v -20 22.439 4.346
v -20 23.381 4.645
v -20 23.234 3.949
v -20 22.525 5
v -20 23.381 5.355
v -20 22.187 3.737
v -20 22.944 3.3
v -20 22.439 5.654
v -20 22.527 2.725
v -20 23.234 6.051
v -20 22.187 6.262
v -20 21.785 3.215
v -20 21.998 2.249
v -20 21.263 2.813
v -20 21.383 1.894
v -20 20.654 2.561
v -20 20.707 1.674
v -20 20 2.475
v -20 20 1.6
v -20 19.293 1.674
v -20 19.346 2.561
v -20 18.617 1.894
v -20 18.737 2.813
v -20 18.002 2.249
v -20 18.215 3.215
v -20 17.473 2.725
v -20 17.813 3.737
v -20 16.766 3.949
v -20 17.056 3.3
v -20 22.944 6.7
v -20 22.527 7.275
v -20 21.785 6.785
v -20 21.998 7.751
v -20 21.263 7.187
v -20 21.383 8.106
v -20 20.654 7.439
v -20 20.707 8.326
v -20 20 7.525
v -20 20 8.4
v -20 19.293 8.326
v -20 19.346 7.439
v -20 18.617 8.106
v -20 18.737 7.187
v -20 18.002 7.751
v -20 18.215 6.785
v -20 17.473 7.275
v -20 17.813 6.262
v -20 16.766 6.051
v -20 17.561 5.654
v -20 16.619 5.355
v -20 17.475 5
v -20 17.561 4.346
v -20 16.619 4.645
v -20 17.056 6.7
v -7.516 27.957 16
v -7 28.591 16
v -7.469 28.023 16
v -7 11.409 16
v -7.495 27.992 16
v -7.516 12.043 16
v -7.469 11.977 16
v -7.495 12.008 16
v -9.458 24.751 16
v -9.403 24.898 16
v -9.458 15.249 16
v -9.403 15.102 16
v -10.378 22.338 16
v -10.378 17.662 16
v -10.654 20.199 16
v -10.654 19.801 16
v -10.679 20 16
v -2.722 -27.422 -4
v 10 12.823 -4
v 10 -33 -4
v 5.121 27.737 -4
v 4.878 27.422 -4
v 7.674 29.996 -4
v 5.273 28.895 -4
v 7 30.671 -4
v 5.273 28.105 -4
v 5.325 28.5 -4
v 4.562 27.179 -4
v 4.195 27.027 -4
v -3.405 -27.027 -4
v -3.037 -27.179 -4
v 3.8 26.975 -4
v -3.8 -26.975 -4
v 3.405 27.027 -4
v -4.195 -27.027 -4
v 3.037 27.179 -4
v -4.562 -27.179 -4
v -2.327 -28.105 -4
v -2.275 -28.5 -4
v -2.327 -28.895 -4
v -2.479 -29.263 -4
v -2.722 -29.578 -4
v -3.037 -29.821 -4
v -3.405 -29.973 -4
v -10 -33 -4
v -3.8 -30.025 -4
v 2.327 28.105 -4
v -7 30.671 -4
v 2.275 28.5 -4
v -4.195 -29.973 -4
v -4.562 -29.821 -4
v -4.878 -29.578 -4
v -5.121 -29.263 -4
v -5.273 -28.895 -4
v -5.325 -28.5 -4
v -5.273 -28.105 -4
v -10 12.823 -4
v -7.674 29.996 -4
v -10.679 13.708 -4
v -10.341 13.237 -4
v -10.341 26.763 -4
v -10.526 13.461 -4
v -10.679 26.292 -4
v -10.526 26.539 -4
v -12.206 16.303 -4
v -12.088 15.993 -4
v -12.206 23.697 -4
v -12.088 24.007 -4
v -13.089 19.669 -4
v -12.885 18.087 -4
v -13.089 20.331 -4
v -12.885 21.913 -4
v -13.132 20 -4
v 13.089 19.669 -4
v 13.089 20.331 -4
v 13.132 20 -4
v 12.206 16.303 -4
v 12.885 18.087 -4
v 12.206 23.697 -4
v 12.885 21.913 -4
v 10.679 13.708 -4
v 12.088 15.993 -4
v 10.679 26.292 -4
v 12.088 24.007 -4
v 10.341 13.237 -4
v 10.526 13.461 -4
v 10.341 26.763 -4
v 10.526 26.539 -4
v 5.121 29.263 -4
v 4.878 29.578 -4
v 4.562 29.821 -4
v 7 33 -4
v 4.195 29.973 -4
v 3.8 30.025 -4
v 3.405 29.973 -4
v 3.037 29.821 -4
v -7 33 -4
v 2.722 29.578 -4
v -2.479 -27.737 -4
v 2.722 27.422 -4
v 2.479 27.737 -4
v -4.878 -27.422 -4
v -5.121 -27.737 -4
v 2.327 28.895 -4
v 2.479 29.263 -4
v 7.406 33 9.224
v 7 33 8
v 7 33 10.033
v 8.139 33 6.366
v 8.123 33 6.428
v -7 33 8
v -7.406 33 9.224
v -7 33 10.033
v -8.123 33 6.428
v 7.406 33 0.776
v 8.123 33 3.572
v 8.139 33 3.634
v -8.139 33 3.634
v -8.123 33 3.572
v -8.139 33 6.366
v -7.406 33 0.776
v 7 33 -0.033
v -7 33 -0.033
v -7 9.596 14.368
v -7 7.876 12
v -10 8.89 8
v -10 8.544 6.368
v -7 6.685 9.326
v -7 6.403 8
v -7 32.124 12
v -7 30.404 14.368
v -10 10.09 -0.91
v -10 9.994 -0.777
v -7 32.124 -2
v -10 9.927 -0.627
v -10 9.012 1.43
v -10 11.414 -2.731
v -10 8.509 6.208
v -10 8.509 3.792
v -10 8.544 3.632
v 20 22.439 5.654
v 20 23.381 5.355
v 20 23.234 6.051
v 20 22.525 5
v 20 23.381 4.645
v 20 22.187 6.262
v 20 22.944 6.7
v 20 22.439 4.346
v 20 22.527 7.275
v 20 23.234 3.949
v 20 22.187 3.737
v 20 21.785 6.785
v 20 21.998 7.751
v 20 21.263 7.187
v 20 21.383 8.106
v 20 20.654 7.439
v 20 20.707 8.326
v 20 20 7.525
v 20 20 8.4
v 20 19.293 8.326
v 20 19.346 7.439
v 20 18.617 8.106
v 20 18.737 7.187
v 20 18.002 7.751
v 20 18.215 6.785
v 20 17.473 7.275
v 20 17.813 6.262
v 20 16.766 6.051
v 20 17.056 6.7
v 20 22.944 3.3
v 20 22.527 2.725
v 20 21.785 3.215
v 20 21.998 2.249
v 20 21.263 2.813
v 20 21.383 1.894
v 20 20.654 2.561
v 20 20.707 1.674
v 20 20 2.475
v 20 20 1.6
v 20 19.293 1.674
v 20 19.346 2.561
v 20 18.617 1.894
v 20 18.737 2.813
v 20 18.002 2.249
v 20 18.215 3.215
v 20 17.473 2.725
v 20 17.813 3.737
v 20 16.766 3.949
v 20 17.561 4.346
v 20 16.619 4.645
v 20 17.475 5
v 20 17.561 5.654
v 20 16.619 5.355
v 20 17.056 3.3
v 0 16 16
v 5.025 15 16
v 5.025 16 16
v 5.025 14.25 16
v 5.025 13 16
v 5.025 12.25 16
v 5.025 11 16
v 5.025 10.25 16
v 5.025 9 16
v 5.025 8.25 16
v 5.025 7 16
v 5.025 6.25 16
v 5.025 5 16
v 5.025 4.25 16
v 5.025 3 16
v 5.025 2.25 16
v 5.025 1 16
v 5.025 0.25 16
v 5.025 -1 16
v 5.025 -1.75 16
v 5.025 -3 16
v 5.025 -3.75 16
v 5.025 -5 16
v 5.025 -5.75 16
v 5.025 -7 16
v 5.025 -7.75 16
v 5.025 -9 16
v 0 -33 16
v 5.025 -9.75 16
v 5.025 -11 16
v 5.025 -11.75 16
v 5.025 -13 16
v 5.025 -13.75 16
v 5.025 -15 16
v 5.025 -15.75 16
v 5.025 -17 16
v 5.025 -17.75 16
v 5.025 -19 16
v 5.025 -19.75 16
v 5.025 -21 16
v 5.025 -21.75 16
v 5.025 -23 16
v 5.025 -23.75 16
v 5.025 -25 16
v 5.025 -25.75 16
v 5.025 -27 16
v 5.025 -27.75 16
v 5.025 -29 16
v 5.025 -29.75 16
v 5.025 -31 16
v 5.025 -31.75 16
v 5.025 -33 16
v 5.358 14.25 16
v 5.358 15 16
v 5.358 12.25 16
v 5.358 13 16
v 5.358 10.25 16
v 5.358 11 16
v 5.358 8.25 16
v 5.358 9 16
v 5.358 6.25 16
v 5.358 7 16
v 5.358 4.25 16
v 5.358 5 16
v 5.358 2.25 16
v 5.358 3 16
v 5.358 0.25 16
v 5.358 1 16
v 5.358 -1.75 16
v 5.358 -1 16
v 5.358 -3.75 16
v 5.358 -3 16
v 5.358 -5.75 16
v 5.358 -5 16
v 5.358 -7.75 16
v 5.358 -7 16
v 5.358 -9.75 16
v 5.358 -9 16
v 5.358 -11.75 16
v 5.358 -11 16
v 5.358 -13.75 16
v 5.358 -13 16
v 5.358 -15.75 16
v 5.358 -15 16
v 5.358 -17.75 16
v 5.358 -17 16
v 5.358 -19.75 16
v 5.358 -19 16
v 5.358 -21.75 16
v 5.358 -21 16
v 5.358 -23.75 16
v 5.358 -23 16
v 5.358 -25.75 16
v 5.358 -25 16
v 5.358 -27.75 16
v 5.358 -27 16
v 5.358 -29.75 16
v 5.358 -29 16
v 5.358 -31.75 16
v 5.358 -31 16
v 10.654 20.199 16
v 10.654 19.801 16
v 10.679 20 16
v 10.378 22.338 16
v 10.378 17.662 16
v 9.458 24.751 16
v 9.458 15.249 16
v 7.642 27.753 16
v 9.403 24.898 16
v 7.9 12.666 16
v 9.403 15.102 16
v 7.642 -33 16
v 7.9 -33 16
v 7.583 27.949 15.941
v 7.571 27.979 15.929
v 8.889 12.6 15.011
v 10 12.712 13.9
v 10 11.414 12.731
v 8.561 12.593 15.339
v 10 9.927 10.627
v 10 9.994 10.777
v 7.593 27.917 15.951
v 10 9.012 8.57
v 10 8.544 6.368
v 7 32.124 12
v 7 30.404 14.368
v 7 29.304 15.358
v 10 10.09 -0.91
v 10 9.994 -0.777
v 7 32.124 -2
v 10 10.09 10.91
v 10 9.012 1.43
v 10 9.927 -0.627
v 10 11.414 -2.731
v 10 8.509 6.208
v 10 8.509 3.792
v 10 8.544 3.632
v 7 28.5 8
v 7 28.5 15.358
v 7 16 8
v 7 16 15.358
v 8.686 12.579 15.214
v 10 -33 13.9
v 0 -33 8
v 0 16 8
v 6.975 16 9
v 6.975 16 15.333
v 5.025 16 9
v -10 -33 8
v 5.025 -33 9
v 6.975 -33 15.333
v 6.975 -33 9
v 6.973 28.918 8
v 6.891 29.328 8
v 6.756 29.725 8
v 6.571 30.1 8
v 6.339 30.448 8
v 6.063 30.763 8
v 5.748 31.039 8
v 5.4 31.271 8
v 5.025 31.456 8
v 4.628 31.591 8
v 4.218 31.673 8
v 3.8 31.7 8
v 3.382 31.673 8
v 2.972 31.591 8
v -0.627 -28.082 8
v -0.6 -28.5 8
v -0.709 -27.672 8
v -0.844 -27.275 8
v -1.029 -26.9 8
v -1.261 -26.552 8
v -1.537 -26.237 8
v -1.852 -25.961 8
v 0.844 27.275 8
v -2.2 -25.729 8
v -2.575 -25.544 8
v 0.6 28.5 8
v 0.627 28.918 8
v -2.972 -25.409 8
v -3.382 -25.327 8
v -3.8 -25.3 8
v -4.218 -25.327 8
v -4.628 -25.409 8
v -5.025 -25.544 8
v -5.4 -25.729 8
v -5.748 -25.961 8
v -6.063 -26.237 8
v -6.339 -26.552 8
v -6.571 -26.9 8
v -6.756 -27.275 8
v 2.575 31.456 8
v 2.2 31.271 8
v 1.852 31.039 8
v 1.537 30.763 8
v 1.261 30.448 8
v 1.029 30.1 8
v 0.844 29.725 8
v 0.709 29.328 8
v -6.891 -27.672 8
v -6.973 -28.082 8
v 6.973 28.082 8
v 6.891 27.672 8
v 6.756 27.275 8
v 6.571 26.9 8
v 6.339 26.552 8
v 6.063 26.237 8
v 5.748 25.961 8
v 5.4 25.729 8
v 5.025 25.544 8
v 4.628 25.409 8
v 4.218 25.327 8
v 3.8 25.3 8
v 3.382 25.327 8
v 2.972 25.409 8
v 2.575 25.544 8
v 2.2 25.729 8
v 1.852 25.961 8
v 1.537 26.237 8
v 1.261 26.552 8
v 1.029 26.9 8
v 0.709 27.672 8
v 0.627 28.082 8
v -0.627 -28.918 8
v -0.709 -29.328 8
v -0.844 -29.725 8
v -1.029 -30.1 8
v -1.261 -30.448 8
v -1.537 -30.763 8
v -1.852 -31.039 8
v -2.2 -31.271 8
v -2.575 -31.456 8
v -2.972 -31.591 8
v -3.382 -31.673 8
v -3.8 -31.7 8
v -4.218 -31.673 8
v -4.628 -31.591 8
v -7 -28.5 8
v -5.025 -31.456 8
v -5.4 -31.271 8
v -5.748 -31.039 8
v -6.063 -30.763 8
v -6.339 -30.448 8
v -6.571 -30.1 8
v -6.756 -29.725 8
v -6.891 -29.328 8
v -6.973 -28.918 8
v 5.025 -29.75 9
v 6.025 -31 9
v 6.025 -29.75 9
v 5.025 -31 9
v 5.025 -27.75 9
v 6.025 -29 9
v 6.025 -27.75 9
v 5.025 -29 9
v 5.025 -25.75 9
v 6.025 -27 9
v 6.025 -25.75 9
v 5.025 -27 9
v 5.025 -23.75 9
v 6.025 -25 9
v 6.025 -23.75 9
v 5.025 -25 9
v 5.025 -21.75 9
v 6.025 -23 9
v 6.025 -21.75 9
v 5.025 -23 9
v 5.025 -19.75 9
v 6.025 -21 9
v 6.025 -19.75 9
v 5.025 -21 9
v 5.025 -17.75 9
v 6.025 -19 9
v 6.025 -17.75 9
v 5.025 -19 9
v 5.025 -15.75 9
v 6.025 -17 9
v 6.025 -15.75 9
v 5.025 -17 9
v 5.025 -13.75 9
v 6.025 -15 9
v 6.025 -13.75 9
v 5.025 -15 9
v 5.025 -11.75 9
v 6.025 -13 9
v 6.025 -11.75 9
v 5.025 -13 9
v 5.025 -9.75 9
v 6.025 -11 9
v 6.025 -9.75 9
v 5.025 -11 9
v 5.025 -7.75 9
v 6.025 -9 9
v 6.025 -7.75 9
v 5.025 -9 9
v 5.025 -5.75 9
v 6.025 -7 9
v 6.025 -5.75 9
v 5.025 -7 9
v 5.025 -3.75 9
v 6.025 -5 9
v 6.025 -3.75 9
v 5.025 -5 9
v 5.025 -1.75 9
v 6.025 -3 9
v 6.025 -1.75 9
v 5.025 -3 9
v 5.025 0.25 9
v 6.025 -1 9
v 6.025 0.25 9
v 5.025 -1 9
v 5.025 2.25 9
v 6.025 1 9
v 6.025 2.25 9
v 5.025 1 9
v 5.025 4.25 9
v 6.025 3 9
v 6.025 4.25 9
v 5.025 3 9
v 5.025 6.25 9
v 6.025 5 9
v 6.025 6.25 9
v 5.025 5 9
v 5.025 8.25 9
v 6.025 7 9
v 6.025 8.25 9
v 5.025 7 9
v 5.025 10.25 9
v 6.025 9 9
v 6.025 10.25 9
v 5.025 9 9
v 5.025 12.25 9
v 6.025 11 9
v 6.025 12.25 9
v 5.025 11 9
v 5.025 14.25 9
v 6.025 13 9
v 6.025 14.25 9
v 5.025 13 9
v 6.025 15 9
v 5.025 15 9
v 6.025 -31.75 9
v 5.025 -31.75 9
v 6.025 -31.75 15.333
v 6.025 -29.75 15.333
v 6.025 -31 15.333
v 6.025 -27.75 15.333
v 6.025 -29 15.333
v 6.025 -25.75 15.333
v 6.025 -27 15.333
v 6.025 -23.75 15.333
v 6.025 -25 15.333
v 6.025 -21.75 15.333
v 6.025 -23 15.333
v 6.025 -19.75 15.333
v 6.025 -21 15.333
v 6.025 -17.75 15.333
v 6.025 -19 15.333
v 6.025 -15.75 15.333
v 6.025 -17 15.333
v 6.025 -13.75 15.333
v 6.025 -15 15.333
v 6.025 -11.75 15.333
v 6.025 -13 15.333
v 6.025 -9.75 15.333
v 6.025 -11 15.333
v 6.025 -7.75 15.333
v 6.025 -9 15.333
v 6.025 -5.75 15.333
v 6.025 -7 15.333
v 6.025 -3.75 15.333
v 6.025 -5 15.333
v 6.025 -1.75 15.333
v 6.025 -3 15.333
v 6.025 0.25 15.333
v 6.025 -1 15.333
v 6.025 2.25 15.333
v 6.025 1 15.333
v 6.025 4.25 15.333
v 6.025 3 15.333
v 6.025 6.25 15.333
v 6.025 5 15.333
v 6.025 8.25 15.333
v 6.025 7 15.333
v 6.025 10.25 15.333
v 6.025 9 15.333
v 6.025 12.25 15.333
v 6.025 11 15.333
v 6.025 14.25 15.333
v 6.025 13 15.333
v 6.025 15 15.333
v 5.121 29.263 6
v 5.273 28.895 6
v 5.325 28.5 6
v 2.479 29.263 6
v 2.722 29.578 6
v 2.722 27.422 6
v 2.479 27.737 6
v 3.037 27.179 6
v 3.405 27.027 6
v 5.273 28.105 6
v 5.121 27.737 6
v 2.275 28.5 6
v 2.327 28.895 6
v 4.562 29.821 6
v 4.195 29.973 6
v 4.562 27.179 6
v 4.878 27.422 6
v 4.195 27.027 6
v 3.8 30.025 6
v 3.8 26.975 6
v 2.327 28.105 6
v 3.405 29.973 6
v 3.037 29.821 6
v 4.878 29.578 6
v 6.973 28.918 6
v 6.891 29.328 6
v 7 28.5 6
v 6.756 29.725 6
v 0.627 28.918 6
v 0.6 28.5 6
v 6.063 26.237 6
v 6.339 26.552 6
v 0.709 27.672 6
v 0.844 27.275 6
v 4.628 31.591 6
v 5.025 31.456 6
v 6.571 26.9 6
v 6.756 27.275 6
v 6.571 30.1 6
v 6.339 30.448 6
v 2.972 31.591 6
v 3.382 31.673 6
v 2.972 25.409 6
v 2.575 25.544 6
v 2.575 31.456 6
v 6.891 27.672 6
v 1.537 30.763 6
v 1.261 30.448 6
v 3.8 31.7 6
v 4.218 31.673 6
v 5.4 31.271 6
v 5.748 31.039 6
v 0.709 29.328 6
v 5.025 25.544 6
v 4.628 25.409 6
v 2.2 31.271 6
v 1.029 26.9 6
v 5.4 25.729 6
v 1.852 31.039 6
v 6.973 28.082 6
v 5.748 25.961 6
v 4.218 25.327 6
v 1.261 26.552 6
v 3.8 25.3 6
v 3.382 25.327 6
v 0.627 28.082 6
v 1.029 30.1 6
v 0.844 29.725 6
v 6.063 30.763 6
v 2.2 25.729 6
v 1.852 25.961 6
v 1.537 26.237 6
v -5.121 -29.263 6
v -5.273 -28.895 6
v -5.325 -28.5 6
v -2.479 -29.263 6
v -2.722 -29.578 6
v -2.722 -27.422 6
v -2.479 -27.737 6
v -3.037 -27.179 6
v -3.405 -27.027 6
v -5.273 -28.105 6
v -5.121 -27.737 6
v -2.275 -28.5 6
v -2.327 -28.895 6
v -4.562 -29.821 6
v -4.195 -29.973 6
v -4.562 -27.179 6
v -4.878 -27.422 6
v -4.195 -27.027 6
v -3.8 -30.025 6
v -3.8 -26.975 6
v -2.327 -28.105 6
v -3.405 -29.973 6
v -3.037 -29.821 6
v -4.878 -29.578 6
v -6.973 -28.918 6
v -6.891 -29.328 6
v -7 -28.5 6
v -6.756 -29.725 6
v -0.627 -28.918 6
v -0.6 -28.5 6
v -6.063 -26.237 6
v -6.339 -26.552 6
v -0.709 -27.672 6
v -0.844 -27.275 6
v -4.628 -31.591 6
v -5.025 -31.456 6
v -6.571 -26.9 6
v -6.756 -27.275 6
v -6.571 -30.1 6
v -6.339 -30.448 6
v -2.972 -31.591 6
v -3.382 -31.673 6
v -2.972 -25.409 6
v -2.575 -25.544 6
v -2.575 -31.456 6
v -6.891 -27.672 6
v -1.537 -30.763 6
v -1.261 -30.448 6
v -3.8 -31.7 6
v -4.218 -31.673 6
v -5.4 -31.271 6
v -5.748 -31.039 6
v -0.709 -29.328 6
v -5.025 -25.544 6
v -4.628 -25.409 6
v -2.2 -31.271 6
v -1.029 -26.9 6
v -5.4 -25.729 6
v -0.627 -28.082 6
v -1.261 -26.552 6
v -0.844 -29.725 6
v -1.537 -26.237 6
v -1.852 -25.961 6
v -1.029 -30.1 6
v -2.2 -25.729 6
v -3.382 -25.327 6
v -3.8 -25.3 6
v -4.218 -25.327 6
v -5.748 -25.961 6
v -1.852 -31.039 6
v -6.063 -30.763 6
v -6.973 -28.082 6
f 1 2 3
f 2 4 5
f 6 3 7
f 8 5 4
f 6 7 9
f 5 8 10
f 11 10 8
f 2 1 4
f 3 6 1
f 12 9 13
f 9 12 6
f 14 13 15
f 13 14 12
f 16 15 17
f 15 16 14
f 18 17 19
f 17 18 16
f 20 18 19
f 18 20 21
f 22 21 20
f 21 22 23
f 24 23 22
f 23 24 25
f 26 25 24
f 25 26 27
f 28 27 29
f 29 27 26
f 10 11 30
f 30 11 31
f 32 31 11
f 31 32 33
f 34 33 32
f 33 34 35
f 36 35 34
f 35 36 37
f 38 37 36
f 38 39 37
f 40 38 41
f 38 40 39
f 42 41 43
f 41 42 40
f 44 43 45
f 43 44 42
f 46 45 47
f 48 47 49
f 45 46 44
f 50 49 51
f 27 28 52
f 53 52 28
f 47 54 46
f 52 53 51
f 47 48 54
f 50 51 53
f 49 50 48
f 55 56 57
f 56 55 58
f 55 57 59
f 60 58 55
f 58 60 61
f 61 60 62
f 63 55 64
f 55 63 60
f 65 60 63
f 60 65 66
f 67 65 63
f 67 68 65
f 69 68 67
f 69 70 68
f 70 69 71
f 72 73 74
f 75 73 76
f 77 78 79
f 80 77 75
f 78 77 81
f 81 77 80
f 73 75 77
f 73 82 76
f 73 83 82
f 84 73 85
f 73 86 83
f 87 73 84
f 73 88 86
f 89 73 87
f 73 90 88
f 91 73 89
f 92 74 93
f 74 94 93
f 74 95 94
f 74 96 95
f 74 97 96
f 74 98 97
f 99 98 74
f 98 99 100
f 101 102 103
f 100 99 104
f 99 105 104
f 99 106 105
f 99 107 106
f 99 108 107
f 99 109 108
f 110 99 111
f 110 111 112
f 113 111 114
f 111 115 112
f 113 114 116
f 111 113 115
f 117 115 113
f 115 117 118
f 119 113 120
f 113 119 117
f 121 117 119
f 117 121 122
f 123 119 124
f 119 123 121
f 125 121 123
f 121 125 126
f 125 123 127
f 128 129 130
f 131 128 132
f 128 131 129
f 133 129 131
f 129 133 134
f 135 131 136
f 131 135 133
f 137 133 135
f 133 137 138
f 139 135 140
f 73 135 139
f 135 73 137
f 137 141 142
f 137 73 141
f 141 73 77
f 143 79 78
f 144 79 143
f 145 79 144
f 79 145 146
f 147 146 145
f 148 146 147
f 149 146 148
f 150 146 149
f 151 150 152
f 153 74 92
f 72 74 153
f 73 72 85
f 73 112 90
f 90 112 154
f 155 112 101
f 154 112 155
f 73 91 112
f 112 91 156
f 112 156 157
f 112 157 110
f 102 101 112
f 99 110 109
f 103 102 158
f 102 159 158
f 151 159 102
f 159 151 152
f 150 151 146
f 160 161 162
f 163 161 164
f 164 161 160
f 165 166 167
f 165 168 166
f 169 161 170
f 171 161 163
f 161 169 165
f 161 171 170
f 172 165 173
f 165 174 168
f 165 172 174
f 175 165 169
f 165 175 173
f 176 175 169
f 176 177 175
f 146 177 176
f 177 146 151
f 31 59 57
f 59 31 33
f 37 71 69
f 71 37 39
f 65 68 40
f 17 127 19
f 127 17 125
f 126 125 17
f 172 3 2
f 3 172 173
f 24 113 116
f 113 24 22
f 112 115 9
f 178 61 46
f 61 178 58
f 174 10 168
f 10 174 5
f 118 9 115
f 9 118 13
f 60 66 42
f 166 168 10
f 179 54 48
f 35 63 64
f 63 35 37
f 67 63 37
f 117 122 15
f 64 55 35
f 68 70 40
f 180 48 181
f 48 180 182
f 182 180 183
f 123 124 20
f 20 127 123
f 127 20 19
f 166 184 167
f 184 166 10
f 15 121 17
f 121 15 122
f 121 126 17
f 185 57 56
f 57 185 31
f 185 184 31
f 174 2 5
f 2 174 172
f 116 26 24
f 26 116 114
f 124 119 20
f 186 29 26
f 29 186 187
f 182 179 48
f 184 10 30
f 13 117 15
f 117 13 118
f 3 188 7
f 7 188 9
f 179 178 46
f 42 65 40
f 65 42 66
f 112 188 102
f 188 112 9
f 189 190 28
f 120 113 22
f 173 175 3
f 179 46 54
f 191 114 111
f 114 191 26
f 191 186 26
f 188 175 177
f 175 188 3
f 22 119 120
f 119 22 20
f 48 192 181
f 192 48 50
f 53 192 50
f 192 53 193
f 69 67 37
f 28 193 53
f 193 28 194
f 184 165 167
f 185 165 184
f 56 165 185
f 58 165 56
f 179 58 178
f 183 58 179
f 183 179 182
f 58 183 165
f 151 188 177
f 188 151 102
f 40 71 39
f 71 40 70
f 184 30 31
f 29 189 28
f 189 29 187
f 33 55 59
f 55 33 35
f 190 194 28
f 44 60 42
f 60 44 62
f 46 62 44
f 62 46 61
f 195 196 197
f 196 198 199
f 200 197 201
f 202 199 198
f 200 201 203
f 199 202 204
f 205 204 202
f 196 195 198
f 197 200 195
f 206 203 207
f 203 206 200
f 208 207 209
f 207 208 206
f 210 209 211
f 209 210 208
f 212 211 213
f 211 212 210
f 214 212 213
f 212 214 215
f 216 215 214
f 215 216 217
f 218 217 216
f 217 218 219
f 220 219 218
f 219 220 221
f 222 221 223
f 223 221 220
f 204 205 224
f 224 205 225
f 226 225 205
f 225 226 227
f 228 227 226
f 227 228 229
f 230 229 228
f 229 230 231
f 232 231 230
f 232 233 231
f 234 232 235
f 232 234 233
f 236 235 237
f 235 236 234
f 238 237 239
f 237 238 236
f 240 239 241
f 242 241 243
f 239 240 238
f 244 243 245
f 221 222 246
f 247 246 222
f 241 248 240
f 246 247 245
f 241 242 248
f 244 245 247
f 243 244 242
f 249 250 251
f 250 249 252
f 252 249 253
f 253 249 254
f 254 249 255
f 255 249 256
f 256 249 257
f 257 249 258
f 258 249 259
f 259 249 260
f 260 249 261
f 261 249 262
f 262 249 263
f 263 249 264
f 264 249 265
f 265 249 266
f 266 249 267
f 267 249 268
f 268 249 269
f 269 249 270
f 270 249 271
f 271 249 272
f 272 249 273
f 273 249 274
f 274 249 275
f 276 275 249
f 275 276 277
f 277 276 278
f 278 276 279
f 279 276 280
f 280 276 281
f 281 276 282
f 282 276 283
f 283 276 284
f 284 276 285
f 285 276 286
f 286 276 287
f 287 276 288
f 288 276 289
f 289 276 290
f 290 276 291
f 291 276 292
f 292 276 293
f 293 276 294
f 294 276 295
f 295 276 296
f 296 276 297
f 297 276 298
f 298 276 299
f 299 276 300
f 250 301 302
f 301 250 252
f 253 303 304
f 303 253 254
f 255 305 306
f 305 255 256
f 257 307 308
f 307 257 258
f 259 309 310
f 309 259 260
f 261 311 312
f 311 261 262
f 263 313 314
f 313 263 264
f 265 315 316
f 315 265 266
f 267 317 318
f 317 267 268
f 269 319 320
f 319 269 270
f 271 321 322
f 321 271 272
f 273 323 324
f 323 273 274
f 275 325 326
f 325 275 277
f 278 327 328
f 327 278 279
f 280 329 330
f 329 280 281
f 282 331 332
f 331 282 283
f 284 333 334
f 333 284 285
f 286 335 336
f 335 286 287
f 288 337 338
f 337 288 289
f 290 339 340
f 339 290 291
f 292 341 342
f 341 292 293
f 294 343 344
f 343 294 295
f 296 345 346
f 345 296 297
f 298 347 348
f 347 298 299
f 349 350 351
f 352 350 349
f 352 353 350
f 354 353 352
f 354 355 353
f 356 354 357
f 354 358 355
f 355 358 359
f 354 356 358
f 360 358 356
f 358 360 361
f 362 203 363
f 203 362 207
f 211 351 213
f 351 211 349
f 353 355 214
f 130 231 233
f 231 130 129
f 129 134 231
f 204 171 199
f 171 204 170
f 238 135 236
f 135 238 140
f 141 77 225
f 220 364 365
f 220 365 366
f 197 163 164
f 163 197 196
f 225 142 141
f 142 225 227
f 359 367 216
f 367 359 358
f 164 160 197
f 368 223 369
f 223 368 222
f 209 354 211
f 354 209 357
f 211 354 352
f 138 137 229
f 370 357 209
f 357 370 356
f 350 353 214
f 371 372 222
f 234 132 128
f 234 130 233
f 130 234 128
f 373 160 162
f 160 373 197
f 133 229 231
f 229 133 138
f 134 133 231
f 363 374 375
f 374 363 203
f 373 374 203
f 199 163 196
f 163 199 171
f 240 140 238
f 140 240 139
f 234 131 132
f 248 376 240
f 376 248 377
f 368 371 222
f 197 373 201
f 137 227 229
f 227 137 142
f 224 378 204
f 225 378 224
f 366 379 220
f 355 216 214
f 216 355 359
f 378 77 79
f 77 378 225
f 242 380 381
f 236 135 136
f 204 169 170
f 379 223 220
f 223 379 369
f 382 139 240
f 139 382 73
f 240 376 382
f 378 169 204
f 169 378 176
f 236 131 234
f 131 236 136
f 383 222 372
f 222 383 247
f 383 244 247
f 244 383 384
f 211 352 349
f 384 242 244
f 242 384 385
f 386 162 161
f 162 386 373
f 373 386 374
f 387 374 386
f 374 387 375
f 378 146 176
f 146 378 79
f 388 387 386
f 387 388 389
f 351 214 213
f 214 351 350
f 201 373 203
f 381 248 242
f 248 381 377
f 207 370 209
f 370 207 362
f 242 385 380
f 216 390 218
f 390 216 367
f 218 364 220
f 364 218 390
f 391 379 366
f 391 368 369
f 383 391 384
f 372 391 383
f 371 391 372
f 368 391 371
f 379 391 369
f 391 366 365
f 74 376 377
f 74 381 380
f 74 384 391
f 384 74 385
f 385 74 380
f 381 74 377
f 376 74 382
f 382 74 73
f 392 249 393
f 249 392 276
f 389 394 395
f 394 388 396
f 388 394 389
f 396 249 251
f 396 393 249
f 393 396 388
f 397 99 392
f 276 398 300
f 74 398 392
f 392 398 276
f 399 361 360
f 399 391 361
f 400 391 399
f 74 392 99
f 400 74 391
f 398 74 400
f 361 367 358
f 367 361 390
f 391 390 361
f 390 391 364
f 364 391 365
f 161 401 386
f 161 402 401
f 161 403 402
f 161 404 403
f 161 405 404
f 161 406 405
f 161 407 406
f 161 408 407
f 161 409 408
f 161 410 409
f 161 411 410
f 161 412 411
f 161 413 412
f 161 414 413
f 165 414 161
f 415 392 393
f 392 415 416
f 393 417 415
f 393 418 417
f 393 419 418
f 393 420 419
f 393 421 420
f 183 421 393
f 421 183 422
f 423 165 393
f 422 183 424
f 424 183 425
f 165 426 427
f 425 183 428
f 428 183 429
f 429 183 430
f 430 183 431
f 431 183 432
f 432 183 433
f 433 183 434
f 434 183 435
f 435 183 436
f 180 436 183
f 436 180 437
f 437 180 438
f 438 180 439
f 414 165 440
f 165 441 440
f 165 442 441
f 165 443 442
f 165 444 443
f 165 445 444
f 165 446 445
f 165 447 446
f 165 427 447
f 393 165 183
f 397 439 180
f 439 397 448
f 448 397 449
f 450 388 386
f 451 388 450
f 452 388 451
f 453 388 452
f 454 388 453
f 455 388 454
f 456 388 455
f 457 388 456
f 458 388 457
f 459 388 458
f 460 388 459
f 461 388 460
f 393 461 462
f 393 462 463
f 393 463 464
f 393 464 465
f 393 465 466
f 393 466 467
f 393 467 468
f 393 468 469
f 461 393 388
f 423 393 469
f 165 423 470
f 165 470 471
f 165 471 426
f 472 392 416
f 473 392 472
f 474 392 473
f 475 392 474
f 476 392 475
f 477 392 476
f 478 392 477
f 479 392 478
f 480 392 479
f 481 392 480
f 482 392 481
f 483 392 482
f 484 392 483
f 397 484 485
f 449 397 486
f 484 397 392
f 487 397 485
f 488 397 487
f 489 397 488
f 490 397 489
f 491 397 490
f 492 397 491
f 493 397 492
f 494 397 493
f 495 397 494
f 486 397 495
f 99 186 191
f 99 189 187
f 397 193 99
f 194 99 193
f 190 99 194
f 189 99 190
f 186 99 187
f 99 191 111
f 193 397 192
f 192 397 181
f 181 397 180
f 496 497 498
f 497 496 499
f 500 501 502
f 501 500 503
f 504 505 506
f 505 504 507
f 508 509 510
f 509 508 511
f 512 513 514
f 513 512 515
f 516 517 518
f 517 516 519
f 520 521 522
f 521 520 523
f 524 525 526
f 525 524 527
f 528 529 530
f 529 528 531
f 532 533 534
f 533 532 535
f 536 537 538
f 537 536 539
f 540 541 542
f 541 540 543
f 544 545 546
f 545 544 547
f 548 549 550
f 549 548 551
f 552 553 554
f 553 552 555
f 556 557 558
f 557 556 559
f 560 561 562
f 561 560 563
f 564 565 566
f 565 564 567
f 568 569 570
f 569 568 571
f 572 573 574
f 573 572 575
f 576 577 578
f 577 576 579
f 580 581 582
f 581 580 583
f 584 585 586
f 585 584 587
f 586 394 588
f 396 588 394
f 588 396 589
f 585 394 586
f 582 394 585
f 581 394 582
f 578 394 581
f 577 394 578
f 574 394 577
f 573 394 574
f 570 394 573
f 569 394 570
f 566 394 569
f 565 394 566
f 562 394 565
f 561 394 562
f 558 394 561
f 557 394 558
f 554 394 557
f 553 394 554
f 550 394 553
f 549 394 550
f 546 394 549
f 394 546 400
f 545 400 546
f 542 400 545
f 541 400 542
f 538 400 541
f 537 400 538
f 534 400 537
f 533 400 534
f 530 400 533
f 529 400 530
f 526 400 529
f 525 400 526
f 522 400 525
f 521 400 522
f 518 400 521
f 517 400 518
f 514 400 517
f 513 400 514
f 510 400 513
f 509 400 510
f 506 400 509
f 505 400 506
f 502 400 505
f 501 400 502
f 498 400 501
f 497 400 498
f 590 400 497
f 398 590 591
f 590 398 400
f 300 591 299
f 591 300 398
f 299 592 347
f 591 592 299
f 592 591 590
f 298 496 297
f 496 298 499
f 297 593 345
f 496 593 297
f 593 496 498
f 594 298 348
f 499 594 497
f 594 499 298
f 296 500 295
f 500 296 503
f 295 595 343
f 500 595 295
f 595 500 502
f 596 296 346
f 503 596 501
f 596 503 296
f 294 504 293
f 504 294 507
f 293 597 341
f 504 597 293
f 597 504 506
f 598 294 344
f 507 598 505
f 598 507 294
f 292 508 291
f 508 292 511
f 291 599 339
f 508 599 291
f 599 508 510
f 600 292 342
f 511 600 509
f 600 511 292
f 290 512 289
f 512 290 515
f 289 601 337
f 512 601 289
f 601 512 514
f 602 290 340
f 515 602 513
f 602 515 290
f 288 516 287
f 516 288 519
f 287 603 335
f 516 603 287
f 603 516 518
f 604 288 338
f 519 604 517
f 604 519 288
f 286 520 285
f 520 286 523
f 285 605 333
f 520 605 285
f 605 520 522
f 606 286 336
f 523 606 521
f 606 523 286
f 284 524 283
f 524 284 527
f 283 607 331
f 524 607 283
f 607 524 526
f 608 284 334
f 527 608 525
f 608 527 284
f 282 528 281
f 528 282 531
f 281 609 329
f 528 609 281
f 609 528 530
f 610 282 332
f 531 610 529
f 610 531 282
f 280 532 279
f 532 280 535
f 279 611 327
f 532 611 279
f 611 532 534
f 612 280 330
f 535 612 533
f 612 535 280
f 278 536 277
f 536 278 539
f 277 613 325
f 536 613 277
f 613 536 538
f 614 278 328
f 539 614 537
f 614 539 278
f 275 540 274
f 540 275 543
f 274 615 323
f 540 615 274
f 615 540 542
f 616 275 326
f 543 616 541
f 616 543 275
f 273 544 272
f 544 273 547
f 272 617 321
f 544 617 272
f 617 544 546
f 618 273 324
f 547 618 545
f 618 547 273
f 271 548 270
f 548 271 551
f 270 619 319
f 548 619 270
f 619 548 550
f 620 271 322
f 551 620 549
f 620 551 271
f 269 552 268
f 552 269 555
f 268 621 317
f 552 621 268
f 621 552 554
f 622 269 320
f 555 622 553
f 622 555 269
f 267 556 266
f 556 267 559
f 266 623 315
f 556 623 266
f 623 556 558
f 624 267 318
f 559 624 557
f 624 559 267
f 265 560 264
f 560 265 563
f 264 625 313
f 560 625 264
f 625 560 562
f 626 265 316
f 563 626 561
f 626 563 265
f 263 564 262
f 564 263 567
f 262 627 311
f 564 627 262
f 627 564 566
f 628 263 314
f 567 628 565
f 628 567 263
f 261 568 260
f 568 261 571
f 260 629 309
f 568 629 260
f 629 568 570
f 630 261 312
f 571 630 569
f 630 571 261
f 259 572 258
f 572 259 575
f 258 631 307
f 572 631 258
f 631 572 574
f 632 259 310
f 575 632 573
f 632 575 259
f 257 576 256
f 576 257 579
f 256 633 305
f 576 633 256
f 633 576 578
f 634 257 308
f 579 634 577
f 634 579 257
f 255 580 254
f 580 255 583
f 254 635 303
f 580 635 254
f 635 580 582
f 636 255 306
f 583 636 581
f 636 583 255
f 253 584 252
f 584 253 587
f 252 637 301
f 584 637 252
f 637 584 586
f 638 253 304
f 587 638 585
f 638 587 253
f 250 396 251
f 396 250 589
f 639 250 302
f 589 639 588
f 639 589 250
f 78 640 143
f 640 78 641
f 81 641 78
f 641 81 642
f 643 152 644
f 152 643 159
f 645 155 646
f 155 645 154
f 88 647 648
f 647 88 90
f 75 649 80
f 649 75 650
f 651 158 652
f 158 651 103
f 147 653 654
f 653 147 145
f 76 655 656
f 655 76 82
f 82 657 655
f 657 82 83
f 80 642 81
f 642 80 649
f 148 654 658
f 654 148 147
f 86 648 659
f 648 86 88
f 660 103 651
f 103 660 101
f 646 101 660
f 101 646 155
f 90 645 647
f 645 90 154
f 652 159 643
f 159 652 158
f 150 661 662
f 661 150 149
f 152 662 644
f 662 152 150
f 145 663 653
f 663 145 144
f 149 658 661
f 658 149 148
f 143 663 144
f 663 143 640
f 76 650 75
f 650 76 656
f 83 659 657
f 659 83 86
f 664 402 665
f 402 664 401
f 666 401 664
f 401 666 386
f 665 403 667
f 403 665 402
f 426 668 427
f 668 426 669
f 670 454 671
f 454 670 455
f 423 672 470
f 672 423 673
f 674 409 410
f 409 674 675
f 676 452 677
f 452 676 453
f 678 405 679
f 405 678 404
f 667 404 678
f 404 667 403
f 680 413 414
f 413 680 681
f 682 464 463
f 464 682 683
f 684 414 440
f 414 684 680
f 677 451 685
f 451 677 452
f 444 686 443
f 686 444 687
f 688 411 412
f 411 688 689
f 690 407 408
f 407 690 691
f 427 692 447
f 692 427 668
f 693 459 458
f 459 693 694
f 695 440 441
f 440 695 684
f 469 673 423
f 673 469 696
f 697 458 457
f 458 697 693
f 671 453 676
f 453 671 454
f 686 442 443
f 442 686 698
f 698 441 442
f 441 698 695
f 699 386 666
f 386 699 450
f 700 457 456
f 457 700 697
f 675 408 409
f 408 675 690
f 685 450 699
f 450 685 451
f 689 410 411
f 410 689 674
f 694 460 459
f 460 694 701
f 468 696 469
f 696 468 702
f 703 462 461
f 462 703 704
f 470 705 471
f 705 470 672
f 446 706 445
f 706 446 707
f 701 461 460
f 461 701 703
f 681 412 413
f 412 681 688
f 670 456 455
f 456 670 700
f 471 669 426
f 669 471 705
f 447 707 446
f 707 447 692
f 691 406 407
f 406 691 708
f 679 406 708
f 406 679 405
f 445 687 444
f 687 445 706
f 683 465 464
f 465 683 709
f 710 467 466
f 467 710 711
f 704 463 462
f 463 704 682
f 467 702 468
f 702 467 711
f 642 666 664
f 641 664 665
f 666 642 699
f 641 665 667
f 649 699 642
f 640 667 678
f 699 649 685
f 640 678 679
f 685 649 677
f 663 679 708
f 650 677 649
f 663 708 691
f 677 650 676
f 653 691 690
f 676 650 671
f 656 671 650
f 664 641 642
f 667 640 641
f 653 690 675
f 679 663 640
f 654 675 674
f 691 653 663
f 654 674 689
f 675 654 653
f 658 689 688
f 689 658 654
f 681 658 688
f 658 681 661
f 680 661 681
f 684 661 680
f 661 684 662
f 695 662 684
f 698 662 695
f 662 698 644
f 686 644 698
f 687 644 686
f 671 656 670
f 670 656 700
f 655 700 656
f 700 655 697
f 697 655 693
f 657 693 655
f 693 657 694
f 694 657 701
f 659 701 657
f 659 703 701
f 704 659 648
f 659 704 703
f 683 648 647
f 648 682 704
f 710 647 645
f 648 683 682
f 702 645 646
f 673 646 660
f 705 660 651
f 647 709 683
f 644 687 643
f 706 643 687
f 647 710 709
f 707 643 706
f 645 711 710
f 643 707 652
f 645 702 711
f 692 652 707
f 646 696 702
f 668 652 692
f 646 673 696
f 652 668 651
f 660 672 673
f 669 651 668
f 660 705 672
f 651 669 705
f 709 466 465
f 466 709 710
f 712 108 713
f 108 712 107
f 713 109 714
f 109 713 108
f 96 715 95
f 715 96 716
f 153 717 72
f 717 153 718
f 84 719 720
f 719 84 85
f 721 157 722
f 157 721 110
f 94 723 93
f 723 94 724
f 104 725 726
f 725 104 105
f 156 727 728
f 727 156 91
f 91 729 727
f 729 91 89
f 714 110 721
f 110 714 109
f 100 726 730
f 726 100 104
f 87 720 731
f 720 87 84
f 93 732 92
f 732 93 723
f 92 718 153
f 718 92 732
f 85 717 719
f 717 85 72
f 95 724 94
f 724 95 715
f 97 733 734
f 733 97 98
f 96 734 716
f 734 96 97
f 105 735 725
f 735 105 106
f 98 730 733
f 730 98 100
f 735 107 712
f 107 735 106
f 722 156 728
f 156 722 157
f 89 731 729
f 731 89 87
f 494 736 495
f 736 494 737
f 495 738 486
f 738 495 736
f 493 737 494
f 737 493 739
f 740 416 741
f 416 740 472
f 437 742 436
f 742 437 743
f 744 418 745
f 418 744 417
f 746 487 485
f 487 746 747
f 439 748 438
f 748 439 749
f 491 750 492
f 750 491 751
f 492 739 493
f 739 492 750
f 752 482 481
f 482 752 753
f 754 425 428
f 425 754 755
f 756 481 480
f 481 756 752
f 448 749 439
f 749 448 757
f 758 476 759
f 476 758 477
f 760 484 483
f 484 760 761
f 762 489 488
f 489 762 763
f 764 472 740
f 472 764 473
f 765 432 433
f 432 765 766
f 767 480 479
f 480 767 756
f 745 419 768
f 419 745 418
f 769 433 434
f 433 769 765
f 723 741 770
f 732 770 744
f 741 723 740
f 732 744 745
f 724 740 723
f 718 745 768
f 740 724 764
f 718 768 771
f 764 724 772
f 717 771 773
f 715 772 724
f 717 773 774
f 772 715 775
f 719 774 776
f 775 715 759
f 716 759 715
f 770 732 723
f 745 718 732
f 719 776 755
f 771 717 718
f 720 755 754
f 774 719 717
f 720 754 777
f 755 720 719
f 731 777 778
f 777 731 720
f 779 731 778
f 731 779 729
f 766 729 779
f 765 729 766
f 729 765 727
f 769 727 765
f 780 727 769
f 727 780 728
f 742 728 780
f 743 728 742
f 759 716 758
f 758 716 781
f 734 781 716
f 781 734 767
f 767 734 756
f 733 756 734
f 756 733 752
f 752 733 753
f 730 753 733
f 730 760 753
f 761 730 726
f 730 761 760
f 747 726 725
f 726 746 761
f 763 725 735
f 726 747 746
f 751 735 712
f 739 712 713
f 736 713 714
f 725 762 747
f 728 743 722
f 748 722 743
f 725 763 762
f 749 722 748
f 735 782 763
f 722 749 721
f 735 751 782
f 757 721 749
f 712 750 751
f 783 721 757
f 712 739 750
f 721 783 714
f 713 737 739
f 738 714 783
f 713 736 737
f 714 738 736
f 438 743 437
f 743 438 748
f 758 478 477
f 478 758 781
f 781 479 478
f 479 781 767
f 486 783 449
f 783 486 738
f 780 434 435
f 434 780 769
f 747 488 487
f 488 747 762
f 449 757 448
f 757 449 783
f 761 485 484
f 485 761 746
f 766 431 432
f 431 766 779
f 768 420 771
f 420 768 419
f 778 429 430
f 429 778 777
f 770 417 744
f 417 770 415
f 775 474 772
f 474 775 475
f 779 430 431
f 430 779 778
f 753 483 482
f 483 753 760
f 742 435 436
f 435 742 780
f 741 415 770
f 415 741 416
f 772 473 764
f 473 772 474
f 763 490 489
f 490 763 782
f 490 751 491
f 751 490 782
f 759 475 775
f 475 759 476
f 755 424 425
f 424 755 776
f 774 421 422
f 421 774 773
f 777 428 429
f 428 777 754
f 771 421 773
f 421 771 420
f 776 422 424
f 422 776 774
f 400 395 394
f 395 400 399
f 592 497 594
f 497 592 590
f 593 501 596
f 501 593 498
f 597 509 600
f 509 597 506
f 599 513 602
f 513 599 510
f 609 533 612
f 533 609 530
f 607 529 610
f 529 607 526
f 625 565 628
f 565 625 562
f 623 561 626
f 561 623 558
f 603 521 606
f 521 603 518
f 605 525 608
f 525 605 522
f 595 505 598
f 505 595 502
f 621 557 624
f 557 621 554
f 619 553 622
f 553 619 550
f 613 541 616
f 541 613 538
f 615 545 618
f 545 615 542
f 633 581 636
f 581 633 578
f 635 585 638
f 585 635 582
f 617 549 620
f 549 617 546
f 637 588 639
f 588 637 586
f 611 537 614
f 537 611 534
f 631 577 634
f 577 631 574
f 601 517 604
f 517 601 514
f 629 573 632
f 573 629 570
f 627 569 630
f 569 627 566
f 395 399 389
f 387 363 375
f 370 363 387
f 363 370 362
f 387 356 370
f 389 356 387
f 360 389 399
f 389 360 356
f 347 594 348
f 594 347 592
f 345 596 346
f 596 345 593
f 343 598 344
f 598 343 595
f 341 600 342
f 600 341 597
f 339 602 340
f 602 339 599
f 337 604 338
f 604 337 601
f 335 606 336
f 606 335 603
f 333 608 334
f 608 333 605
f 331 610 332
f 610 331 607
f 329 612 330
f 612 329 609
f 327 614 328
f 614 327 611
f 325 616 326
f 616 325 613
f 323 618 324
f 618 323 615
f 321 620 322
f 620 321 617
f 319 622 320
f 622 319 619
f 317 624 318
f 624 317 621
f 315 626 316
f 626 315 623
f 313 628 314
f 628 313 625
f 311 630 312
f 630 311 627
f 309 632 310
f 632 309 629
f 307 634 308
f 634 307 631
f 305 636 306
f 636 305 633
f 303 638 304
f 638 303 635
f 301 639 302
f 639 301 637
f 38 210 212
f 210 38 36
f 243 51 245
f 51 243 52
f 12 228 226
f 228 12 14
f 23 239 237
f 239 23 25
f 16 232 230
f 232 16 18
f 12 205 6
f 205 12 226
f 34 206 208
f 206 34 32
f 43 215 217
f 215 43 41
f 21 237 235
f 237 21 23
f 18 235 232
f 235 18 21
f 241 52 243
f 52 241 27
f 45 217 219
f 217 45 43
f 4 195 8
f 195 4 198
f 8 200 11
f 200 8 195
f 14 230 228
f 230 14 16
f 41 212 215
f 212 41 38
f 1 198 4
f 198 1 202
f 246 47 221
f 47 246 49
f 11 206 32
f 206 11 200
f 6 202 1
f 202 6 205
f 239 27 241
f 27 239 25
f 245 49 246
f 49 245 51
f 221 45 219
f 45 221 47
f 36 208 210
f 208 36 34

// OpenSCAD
// file: configuration.scad
// Increase this if your slicer or printer make holes too tight.
extra_radius = 0.1;

// OD = outside diameter, corner to corner.
m3_nut_od = 6.1;
m3_nut_radius = m3_nut_od/2 + 0.2 + extra_radius;
m3_washer_radius = 3.5 + extra_radius;

m4_nut_od = 7.6;
m4_nut_radius = m4_nut_od/2 + 0.2 + extra_radius;
m4_washer_radius = 4.4 + extra_radius;

// Major diameter of metric 3mm thread.
m3_major = 2.85;
m3_radius = m3_major/2 + extra_radius;
m3_wide_radius = m3_major/2 + extra_radius + 0.2;

// Major diameter of metric 4mm thread.
m4_major = 4.85;
m4_radius = m4_major/2 + extra_radius;
m4_wide_radius = m4_major/2 + extra_radius + 0.2;


// NEMA17 stepper motors.
motor_shaft_diameter = 5;
motor_shaft_radius = motor_shaft_diameter/2 + extra_radius;

// Frame brackets. M3x8mm screws work best with 3.6 mm brackets.
thickness = 3.6;

// OpenBeam or Misumi. Currently only 15x15 mm, but there is a plan
// to make models more parametric and allow 20x20 mm in the future.
extrusion = 20;

// Placement for the NEMA17 stepper motors.
motor_offset = 44;
motor_length = 47;
// main file
include <configuration.scad>;

separation = 40;

width = 20;
height = 66;

horn_thickness = 10;
horn_x = 7;
horn_y = 20;

belt_width = 6+1;
belt_x = 6.5;
belt_z = 10-1;
belt_thickness = 0.95;

base_thickness = belt_z+3;

module carriage() {
	difference() {
	union() {
      // Ball joint mount horns.
      for (x = [-1, 1]) {
        scale([x, 1, 1]) intersection() {
          translate([0, 0, horn_thickness/2+1])
            cube([separation, height, horn_thickness+10], center=true);
          translate([horn_x, horn_y, horn_thickness/2]) rotate([0, 90, 0])
            cylinder(r1=14, r2=3.4, h=separation/2-horn_x);
        }
      }

      translate([-width/2, -height/2, -4])
			cube([width, height-6, base_thickness]);
      translate([-horn_x, horn_y+4, -4])
			cube([horn_x*2, height/2-horn_y-4, base_thickness]);

		difference() {
		   translate([0, -height/2, 0])
   			cube([width/2, height/2+horn_y-4, belt_z+belt_width]);
		   translate([belt_x+1.4, -height/2, belt_z+belt_width])
   		rotate([0,45,0]) cube([width/2, height/2+horn_y-4, belt_z+belt_width]);
		}
	}

	translate([belt_x-belt_thickness/2, -height/2, belt_z])
		cube([belt_thickness, height, belt_width]);

	for(y=[-height/2:2:horn_y]) {
		translate([belt_x-belt_thickness/2-1.0, y, belt_z])
			cube([1.1,1.25,belt_width+2]);
	}
	translate([belt_x, 0, belt_z+belt_width])
	rotate([0,45,0]) cube([belt_thickness*1.7,height,belt_thickness*1.7], center=true);

	translate([0,horn_y,horn_thickness/2])
	rotate([0,90,0])
		cylinder(r=m4_radius, h=separation+1, center=true,$fn=24);

	for(a=[0,180]) rotate([0,0,a]) {
	translate([width/4-1.2,height/2-4.5,-4]) 
		cylinder(r=m3_radius,h=20,$fn=24);
	translate([width/4-1.2,height/2-4.5,6]) 
		cylinder(r=3.2,h=belt_width+belt_z+3,$fn=48);
	}


	}
}

carriage();
